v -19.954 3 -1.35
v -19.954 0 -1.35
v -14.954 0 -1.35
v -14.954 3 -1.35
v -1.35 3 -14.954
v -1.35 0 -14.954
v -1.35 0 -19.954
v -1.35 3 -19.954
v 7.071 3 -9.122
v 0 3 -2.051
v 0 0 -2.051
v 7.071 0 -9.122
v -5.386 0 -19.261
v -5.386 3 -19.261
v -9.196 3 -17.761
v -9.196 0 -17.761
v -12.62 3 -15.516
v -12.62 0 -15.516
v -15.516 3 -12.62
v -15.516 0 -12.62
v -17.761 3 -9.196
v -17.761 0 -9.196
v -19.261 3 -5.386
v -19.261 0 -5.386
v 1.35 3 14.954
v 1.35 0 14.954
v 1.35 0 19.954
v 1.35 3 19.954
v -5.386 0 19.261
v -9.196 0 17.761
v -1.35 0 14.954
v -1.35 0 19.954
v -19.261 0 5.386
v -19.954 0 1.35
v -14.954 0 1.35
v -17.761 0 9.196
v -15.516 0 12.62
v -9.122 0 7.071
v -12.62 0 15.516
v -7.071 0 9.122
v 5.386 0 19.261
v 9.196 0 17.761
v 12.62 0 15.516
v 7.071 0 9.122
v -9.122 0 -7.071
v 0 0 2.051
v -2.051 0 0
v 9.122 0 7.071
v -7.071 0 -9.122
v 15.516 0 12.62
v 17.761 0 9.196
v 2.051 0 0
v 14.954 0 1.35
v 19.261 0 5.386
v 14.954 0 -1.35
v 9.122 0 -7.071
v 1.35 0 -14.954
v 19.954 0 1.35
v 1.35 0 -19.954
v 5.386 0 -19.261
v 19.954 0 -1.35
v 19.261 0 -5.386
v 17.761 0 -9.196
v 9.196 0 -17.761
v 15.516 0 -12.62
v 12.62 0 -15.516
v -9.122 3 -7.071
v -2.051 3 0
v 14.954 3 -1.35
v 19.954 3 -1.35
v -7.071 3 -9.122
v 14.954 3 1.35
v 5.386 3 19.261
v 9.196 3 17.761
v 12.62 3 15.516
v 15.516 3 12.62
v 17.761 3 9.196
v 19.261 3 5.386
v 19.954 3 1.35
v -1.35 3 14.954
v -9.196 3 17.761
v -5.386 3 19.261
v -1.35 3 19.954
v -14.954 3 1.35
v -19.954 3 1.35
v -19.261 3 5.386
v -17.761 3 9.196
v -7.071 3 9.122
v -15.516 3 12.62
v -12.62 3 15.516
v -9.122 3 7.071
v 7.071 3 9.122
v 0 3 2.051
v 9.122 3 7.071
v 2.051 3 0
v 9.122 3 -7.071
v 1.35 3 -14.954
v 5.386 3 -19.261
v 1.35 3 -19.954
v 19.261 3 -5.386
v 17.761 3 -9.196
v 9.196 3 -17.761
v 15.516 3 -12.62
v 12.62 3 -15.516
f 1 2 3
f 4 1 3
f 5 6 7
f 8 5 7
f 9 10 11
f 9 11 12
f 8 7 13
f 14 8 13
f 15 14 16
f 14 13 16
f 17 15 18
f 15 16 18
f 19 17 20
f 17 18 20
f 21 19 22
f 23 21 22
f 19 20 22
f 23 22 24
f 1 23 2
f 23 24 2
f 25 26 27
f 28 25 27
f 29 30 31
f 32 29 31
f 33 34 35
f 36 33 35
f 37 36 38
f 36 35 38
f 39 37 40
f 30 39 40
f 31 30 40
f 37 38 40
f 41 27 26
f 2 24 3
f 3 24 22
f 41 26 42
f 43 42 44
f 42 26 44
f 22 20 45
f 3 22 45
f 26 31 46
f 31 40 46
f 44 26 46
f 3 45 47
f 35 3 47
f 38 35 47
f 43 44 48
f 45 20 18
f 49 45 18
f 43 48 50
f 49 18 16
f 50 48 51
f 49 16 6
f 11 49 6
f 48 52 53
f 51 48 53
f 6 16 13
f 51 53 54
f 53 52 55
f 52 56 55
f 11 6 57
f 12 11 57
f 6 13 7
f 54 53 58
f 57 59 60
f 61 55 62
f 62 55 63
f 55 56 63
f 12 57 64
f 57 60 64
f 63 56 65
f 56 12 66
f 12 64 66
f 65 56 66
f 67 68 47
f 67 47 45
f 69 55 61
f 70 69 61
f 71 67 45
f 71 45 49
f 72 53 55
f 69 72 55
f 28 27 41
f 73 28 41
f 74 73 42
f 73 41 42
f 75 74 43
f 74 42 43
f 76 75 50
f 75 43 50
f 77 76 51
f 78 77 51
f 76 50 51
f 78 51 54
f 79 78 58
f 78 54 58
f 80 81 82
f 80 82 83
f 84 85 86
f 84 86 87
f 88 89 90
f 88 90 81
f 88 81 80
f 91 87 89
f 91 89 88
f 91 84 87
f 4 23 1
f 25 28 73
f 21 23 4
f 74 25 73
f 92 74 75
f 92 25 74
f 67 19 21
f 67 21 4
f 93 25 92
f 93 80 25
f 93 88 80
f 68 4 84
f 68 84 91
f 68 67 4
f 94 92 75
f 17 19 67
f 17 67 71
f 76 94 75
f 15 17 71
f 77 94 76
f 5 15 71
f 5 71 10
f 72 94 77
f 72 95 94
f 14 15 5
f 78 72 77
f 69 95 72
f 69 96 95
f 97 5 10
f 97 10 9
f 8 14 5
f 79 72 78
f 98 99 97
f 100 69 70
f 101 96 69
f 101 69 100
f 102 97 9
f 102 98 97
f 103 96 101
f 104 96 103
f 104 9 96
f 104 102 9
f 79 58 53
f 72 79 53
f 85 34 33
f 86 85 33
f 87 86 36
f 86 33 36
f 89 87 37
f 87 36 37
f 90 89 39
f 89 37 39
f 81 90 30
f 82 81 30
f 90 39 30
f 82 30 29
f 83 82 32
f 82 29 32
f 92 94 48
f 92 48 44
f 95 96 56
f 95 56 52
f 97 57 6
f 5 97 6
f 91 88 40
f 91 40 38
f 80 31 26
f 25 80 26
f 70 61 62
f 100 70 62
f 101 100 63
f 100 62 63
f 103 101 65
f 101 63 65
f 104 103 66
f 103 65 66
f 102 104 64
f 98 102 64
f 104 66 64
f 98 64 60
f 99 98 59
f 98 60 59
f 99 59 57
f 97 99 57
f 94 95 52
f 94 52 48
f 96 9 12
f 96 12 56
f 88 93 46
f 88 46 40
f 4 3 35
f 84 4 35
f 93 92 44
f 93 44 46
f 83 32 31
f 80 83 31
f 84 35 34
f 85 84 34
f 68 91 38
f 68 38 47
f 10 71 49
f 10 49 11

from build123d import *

# Parameters (mm, degrees)
BOSS_EXTRUDE1_DEPTH = 3
CUT_EXTRUDE1_REACH  = 5


with BuildPart() as part:
    # Sketch1 → Boss-Extrude1 (new body)
    with BuildSketch(Plane(origin=(0, 0, 0), x_dir=(1, 0, 0), z_dir=(0, 1, 0))):
        with BuildLine():
            Line((1.35, 14.954385483), (-1.35, 14.954385483))
            Line((-1.35, 14.954385483), (-1.35, 19.954385483))
            ThreePointArc((-1.35, 19.954385483), (-14.142135624, 14.142135624), (-19.954385483, 1.35))
            Line((-19.954385483, 1.35), (-14.954385483, 1.35))
            Line((-14.954385483, 1.35), (-14.954385483, -1.35))
            Line((-14.954385483, -1.35), (-19.954385483, -1.35))
            ThreePointArc((-19.954385483, -1.35), (-14.142135624, -14.142135624), (-1.35, -19.954385483))
            Line((-1.35, -19.954385483), (-1.35, -14.954385483))
            Line((-1.35, -14.954385483), (1.35, -14.954385483))
            Line((1.35, -14.954385483), (1.35, -19.954385483))
            ThreePointArc((1.35, -19.954385483), (14.142135624, -14.142135624), (19.954385483, -1.35))
            Line((19.954385483, -1.35), (14.954385483, -1.35))
            Line((14.954385483, -1.35), (14.954385483, 1.35))
            Line((14.954385483, 1.35), (19.954385483, 1.35))
            ThreePointArc((19.954385483, 1.35), (14.142135624, 14.142135624), (1.35, 19.954385483))
            Line((1.35, 19.954385483), (1.35, 14.954385483))
        make_face()
    extrude(amount=BOSS_EXTRUDE1_DEPTH)

    # Sketch3 → Cut-Extrude1 (cut, up to next)
    with BuildSketch(Plane(origin=(0, 3, 0), x_dir=(1, 0, 0), z_dir=(0, 1, 0)), mode=Mode.PRIVATE) as cut_extrude1_sk1:
        Polygon((0, 2.050609665), (7.071067812, 9.121677477), (9.121677477, 7.071067812), (2.050609665, 0), (9.121677477, -7.071067812), (7.071067812, -9.121677477), (0, -2.050609665), (-7.071067812, -9.121677477), (-9.121677477, -7.071067812), (-2.050609665, 0), (-9.121677477, 7.071067812), (-7.071067812, 9.121677477), align=None)
    cut_extrude1_tool1 = extrude(cut_extrude1_sk1.sketch, amount=-CUT_EXTRUDE1_REACH, mode=Mode.PRIVATE) & part.part
    add(cut_extrude1_tool1.solids().sort_by_distance((0, 3, 0))[0], mode=Mode.SUBTRACT)


solid = part.part
